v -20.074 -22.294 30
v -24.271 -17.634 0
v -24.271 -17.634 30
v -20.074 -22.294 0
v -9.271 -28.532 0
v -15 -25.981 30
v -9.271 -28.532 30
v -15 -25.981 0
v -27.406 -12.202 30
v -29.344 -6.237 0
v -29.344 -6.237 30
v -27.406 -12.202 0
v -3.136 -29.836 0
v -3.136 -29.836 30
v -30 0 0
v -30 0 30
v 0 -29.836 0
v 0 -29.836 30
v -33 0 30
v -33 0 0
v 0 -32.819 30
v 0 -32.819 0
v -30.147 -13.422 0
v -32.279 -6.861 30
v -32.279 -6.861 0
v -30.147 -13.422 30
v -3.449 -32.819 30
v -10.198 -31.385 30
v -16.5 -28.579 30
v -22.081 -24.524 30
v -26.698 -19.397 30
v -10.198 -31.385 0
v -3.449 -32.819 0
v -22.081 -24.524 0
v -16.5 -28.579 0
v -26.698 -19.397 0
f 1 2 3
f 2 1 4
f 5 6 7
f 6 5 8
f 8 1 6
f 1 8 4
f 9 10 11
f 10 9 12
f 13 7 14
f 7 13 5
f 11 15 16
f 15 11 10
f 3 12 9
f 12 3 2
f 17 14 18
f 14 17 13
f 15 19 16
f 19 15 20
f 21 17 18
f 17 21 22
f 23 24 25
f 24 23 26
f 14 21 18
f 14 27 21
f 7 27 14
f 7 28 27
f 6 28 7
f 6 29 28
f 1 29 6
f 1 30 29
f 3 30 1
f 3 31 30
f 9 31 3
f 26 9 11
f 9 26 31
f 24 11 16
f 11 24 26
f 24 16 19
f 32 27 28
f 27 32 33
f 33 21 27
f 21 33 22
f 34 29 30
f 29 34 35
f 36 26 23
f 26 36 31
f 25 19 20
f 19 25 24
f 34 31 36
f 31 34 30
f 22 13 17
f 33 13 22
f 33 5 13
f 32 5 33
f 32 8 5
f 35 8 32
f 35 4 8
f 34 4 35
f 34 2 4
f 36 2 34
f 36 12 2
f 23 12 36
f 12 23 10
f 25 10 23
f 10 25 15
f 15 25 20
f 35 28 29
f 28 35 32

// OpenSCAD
wall = 5;
diameter = 100;
radius = diameter / 2;

outer_bound = radius + wall;


rounded_corner(wall = 3, radius = 30, height = 30, corners = [0, 0, 0, 1]);

/**
 * Create a rounded corner.
 * @param int wall Thickness of the wall.
 * @param int radius Radius of the rounded corner.
 * @param int height How tall the corner should be.
 * @param array corners [topLeft, topRight, bottomRight, bottomLeft]
 * The orientation of the corner.
 */
module rounded_corner(wall, radius, height, corners = [0, 1, 0, 0]) {
	diameter = radius * 2;
	outer_bound = radius + wall;

	subtract_height = height + 2;

	difference() {
		cylinder(r = outer_bound, h = height);
		translate([0, 0, -1]) {
			cylinder(r = radius, h = subtract_height);
	
             
			// Remove the top left section
			if (!corners[0])
				_rounded_corner_section(outer_bound, subtract_height, [1, 0, 0]);

			// remove the top right section
			if (!corners[1])
				_rounded_corner_section(outer_bound, subtract_height, [0, 0, 0]);

			// Remove the bottom right section
			if (!corners[2])
				_rounded_corner_section(outer_bound, subtract_height, [0, 1, 0]);

			// Remove the bottom left section
			if (!corners[3])
				_rounded_corner_section(outer_bound, subtract_height, [1, 1, 0]);



			// Remove the artifact between the top right and top left
			if (!corners[0] && !corners[1])
				_rounded_corner_artifact(outer_bound, subtract_height, [0, 1]);
			
			// Remove the artifact between the top right and bottom right
			if (!corners[1] && !corners[2])
				_rounded_corner_artifact(outer_bound, subtract_height, [1, 0]);

			// Remove the artifact between the bottom right and bottom left
			if (!corners[2] && !corners[3])
				_rounded_corner_artifact(outer_bound, subtract_height, [0, -1]);

			// Remove the artifact between the bottom left and top left
			if (!corners[3] && !corners[0])
				_rounded_corner_artifact(outer_bound, subtract_height, [-1, 0]);
		}
	}
}

/**
 * Generate a cube the right size to remove the segment of the corner
 */
module _rounded_corner_section(size, height, location = [0, 0, 0]) {
	mirror(location) {
		cube([size, size, height]);
	}
} 

module _rounded_corner_artifact(size, height, location = [0, 0]) {
	translate([location[0] * size - size / 2, location[1] * size - size / 2, 0]) {
		color("blue") cube([size, size, height]);
	}
}
